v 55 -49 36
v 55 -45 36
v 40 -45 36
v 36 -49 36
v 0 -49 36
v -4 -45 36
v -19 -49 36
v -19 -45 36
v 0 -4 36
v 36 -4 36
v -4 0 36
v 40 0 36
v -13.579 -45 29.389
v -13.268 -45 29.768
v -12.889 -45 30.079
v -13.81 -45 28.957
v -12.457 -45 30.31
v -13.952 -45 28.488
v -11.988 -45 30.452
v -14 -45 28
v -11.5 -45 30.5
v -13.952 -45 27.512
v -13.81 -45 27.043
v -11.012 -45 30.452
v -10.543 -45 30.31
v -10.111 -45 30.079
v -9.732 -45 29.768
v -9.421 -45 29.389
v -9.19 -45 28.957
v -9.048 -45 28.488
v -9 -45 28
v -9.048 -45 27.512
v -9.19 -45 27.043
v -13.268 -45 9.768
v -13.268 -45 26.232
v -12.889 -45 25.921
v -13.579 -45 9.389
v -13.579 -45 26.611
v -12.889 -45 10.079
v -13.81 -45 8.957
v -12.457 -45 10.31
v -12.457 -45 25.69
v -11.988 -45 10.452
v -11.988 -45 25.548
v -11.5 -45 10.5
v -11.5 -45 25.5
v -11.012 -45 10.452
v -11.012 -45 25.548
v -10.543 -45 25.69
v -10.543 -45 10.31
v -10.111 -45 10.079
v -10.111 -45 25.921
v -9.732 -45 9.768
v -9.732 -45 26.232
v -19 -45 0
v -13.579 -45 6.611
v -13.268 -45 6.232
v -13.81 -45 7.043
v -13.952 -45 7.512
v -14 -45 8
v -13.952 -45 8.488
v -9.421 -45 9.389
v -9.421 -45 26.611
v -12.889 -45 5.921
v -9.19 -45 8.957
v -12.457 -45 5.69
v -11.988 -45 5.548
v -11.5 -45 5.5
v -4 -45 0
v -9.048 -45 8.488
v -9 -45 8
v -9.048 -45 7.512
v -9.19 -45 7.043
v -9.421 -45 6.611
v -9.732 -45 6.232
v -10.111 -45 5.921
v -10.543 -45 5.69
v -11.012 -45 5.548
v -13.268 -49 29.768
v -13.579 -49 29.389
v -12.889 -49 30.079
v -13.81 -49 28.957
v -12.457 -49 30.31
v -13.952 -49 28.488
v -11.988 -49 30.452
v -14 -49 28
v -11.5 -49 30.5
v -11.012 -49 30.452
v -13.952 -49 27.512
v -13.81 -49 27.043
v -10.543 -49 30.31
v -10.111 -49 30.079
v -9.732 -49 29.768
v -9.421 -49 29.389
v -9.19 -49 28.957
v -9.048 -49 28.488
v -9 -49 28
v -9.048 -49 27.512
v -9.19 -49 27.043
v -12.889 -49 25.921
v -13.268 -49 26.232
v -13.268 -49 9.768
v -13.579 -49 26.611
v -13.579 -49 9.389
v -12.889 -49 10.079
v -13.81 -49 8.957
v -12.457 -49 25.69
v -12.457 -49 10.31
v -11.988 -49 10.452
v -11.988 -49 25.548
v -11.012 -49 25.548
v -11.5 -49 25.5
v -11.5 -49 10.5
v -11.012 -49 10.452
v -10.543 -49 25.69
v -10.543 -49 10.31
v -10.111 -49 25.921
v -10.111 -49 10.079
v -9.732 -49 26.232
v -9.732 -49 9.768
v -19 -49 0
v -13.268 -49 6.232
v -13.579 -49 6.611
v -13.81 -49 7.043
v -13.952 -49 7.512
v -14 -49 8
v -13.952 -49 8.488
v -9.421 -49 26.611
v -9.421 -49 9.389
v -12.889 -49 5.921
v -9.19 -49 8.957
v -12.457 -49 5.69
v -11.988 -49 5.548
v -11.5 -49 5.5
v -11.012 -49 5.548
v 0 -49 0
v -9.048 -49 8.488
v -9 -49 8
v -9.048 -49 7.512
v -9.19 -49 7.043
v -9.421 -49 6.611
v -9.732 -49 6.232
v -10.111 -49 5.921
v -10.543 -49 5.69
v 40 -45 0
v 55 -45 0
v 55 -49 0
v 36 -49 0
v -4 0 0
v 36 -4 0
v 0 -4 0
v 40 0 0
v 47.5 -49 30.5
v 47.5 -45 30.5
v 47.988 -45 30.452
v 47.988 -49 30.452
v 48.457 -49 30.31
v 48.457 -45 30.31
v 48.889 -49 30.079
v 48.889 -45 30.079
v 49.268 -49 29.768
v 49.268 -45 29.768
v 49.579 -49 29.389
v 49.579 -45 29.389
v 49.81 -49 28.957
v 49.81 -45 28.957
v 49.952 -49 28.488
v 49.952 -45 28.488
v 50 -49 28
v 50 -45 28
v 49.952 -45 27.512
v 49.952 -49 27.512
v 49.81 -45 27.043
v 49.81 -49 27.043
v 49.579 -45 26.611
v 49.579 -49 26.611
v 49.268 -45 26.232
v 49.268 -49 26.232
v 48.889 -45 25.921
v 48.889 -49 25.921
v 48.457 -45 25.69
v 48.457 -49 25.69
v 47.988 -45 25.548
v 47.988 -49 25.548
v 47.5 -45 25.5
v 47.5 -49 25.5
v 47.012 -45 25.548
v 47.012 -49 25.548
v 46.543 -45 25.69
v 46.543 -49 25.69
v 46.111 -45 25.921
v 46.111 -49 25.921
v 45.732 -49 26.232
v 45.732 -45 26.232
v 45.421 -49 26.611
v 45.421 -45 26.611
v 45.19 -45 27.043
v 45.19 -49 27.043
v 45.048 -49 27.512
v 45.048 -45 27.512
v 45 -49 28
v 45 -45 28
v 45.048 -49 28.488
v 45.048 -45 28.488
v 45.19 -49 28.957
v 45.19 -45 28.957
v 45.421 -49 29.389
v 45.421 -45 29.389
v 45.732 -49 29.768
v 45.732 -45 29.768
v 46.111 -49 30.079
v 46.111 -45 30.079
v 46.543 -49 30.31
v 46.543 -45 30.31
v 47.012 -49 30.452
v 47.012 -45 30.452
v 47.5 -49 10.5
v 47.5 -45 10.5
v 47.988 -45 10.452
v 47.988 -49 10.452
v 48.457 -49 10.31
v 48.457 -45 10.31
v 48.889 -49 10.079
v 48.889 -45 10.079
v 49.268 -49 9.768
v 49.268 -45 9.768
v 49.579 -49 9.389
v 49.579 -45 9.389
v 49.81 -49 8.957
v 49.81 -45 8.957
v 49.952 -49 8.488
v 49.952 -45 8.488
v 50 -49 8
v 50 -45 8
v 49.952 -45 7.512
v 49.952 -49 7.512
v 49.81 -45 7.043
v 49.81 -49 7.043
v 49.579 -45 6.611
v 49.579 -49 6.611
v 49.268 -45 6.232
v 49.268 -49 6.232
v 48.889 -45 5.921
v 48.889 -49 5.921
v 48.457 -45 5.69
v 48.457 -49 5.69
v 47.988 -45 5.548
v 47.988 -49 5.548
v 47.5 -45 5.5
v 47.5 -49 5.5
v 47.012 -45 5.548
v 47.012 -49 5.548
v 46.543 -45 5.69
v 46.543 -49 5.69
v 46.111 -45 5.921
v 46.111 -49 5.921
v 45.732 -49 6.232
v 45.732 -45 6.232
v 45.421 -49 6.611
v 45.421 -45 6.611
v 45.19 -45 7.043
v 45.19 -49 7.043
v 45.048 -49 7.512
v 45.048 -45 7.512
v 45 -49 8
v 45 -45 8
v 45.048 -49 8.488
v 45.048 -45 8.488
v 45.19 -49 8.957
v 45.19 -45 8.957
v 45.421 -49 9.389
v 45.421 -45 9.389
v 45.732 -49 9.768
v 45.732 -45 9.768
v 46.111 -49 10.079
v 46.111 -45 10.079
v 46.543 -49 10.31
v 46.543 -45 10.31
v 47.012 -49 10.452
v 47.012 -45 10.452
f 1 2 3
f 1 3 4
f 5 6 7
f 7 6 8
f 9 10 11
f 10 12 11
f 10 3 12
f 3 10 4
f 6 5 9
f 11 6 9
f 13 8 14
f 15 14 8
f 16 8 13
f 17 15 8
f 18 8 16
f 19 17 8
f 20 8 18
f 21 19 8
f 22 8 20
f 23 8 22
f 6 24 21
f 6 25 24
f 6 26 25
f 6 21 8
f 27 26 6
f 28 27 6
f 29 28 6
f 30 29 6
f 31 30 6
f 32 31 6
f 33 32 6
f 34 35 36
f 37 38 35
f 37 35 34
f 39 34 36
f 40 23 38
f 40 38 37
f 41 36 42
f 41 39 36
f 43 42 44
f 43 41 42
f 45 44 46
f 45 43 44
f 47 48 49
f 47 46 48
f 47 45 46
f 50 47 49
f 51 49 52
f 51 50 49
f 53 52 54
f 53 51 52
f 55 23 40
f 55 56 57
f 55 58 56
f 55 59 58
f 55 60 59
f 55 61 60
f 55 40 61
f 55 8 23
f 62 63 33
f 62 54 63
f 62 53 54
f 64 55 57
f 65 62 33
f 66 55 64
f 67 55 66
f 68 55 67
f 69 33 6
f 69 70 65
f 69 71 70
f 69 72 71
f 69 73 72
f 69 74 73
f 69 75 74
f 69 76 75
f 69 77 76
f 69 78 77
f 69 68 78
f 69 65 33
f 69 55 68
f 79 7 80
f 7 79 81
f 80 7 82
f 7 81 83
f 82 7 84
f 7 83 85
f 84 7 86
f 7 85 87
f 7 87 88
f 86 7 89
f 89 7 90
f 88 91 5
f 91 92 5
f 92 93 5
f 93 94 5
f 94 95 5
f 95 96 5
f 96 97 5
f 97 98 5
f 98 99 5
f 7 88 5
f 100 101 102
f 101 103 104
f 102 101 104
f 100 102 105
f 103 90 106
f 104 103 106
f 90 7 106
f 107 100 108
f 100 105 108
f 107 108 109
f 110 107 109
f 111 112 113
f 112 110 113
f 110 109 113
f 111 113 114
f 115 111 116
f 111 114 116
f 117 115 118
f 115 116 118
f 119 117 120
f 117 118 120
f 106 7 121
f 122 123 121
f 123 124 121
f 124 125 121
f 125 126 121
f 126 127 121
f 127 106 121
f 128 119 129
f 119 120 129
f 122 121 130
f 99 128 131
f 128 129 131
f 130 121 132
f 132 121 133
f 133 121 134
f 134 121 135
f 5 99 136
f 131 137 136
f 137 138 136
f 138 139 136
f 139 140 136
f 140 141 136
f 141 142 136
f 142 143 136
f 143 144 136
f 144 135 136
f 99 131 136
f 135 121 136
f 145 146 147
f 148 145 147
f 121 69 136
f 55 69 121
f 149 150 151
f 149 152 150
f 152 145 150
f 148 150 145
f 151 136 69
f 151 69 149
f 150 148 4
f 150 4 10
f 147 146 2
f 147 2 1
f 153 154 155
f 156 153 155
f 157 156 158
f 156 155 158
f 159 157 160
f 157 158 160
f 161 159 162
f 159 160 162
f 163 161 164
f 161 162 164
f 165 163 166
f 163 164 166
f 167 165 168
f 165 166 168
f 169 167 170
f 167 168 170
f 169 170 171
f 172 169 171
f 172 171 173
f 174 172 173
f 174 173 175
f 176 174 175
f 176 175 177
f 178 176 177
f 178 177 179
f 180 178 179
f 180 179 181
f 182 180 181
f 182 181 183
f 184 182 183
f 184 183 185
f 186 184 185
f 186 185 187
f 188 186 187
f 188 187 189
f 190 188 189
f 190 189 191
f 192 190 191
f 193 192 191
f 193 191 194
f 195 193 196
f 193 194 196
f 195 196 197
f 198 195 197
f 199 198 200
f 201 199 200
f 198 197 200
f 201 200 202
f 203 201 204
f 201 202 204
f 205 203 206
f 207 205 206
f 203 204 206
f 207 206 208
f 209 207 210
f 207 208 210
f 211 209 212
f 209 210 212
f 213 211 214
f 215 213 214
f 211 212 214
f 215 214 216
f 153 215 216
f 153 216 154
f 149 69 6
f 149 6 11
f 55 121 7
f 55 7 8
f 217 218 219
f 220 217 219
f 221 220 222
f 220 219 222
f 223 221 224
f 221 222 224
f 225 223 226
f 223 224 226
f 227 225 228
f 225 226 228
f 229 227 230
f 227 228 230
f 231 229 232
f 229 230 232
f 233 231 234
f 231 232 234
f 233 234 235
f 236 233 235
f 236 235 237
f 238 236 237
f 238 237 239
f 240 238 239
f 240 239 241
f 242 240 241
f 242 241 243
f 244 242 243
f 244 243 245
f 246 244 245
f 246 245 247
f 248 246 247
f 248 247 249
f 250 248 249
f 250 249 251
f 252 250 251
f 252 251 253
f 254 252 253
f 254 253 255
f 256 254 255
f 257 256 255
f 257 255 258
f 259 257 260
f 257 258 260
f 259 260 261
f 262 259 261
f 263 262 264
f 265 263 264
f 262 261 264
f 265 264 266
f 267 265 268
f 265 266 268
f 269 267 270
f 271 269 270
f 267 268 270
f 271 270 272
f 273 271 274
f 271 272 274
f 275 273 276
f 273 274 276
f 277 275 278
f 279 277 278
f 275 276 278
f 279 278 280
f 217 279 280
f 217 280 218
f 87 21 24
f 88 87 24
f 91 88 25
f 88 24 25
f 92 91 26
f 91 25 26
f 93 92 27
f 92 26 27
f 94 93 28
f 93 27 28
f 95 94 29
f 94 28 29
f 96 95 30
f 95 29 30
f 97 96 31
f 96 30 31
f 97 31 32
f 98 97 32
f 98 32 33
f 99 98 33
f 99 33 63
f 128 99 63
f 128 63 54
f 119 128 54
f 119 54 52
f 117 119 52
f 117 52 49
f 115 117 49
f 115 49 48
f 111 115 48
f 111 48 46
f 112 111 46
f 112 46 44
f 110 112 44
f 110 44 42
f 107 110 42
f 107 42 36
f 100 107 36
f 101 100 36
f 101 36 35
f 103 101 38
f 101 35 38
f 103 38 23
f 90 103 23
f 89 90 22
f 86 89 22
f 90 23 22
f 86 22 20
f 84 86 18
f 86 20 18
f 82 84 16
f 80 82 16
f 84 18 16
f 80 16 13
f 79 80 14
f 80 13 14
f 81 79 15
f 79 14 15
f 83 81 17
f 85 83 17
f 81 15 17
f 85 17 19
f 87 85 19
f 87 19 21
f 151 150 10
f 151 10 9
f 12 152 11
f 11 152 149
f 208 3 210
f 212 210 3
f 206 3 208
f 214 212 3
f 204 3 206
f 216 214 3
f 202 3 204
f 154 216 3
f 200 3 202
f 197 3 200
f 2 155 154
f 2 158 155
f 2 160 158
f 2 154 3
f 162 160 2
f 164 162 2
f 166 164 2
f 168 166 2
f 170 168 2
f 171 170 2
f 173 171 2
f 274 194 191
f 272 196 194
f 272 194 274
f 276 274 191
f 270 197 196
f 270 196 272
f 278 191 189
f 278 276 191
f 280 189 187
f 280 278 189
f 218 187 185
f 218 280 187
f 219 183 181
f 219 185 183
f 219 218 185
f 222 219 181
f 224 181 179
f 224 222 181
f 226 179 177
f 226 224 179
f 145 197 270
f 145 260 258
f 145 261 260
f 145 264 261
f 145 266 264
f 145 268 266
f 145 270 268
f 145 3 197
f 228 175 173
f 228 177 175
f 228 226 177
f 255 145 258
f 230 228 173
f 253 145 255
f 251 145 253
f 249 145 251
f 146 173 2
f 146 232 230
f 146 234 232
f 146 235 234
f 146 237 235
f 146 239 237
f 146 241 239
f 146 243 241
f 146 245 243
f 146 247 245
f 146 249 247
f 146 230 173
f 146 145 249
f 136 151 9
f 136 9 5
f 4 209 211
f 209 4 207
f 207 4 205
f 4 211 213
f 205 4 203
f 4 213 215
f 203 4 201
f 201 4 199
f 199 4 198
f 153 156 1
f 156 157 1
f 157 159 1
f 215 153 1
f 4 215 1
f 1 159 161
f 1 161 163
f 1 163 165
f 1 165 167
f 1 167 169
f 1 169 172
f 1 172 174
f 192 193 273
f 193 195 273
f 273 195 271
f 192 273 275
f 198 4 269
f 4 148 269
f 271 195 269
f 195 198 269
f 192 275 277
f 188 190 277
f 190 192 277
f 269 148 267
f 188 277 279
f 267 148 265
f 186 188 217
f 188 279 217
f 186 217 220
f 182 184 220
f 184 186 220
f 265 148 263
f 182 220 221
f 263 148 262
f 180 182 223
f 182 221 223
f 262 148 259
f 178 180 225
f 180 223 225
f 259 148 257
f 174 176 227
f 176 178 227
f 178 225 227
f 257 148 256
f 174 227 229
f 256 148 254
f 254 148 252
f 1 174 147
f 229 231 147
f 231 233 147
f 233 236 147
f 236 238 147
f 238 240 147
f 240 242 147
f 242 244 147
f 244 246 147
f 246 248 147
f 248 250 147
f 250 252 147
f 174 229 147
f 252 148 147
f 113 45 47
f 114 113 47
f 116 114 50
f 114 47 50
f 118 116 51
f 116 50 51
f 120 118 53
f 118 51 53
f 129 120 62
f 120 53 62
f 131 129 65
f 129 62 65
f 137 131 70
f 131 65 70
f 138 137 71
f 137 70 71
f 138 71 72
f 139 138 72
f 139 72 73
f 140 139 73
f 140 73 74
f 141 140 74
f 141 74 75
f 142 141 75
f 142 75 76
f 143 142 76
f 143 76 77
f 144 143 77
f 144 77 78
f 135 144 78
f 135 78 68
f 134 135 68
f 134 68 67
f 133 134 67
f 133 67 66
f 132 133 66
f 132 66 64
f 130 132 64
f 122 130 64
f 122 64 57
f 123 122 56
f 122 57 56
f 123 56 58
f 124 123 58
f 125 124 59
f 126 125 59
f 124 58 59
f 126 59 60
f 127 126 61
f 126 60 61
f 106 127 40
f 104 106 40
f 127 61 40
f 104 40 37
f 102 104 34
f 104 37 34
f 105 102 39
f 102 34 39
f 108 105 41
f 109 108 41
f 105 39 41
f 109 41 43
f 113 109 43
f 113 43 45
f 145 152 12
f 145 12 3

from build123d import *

# Parameters (mm, degrees)
EXTRUDE_1_DEPTH     = 36
SKETCH_2_R          = 2.5
CUT_EXTRUDE_1_DEPTH = 36


with BuildPart() as part:
    # 草图1 → 凸台-拉伸1 (new body)
    with BuildSketch(Plane.XY):
        Polygon((-4, 0), (0, 0), (36, 0), (40, 0), (40, -45), (55, -45), (55, -49), (40, -49), (36, -49), (36, -4), (0, -4), (0, -49), (-4, -49), (-19, -49), (-19, -45), (-4, -45), align=None)
    extrude(amount=EXTRUDE_1_DEPTH)

    # 草图2 → 切除-拉伸1 (cut)
    with BuildSketch(Plane(origin=(0, -45, 0), x_dir=(1, 0, 0), z_dir=(0, 1, 0))):
        with Locations(Location((-11.5, -8, 0), (0, 0, 270))):
            Circle(SKETCH_2_R)
        with Locations(Location((-11.5, -28, 0), (0, 0, 270))):
            Circle(SKETCH_2_R)
        with Locations(Location((47.5, -28, 0), (0, 0, 270))):
            Circle(SKETCH_2_R)
        with Locations(Location((47.5, -8, 0), (0, 0, 270))):
            Circle(SKETCH_2_R)
    extrude(amount=-CUT_EXTRUDE_1_DEPTH, mode=Mode.SUBTRACT)


solid = part.part
